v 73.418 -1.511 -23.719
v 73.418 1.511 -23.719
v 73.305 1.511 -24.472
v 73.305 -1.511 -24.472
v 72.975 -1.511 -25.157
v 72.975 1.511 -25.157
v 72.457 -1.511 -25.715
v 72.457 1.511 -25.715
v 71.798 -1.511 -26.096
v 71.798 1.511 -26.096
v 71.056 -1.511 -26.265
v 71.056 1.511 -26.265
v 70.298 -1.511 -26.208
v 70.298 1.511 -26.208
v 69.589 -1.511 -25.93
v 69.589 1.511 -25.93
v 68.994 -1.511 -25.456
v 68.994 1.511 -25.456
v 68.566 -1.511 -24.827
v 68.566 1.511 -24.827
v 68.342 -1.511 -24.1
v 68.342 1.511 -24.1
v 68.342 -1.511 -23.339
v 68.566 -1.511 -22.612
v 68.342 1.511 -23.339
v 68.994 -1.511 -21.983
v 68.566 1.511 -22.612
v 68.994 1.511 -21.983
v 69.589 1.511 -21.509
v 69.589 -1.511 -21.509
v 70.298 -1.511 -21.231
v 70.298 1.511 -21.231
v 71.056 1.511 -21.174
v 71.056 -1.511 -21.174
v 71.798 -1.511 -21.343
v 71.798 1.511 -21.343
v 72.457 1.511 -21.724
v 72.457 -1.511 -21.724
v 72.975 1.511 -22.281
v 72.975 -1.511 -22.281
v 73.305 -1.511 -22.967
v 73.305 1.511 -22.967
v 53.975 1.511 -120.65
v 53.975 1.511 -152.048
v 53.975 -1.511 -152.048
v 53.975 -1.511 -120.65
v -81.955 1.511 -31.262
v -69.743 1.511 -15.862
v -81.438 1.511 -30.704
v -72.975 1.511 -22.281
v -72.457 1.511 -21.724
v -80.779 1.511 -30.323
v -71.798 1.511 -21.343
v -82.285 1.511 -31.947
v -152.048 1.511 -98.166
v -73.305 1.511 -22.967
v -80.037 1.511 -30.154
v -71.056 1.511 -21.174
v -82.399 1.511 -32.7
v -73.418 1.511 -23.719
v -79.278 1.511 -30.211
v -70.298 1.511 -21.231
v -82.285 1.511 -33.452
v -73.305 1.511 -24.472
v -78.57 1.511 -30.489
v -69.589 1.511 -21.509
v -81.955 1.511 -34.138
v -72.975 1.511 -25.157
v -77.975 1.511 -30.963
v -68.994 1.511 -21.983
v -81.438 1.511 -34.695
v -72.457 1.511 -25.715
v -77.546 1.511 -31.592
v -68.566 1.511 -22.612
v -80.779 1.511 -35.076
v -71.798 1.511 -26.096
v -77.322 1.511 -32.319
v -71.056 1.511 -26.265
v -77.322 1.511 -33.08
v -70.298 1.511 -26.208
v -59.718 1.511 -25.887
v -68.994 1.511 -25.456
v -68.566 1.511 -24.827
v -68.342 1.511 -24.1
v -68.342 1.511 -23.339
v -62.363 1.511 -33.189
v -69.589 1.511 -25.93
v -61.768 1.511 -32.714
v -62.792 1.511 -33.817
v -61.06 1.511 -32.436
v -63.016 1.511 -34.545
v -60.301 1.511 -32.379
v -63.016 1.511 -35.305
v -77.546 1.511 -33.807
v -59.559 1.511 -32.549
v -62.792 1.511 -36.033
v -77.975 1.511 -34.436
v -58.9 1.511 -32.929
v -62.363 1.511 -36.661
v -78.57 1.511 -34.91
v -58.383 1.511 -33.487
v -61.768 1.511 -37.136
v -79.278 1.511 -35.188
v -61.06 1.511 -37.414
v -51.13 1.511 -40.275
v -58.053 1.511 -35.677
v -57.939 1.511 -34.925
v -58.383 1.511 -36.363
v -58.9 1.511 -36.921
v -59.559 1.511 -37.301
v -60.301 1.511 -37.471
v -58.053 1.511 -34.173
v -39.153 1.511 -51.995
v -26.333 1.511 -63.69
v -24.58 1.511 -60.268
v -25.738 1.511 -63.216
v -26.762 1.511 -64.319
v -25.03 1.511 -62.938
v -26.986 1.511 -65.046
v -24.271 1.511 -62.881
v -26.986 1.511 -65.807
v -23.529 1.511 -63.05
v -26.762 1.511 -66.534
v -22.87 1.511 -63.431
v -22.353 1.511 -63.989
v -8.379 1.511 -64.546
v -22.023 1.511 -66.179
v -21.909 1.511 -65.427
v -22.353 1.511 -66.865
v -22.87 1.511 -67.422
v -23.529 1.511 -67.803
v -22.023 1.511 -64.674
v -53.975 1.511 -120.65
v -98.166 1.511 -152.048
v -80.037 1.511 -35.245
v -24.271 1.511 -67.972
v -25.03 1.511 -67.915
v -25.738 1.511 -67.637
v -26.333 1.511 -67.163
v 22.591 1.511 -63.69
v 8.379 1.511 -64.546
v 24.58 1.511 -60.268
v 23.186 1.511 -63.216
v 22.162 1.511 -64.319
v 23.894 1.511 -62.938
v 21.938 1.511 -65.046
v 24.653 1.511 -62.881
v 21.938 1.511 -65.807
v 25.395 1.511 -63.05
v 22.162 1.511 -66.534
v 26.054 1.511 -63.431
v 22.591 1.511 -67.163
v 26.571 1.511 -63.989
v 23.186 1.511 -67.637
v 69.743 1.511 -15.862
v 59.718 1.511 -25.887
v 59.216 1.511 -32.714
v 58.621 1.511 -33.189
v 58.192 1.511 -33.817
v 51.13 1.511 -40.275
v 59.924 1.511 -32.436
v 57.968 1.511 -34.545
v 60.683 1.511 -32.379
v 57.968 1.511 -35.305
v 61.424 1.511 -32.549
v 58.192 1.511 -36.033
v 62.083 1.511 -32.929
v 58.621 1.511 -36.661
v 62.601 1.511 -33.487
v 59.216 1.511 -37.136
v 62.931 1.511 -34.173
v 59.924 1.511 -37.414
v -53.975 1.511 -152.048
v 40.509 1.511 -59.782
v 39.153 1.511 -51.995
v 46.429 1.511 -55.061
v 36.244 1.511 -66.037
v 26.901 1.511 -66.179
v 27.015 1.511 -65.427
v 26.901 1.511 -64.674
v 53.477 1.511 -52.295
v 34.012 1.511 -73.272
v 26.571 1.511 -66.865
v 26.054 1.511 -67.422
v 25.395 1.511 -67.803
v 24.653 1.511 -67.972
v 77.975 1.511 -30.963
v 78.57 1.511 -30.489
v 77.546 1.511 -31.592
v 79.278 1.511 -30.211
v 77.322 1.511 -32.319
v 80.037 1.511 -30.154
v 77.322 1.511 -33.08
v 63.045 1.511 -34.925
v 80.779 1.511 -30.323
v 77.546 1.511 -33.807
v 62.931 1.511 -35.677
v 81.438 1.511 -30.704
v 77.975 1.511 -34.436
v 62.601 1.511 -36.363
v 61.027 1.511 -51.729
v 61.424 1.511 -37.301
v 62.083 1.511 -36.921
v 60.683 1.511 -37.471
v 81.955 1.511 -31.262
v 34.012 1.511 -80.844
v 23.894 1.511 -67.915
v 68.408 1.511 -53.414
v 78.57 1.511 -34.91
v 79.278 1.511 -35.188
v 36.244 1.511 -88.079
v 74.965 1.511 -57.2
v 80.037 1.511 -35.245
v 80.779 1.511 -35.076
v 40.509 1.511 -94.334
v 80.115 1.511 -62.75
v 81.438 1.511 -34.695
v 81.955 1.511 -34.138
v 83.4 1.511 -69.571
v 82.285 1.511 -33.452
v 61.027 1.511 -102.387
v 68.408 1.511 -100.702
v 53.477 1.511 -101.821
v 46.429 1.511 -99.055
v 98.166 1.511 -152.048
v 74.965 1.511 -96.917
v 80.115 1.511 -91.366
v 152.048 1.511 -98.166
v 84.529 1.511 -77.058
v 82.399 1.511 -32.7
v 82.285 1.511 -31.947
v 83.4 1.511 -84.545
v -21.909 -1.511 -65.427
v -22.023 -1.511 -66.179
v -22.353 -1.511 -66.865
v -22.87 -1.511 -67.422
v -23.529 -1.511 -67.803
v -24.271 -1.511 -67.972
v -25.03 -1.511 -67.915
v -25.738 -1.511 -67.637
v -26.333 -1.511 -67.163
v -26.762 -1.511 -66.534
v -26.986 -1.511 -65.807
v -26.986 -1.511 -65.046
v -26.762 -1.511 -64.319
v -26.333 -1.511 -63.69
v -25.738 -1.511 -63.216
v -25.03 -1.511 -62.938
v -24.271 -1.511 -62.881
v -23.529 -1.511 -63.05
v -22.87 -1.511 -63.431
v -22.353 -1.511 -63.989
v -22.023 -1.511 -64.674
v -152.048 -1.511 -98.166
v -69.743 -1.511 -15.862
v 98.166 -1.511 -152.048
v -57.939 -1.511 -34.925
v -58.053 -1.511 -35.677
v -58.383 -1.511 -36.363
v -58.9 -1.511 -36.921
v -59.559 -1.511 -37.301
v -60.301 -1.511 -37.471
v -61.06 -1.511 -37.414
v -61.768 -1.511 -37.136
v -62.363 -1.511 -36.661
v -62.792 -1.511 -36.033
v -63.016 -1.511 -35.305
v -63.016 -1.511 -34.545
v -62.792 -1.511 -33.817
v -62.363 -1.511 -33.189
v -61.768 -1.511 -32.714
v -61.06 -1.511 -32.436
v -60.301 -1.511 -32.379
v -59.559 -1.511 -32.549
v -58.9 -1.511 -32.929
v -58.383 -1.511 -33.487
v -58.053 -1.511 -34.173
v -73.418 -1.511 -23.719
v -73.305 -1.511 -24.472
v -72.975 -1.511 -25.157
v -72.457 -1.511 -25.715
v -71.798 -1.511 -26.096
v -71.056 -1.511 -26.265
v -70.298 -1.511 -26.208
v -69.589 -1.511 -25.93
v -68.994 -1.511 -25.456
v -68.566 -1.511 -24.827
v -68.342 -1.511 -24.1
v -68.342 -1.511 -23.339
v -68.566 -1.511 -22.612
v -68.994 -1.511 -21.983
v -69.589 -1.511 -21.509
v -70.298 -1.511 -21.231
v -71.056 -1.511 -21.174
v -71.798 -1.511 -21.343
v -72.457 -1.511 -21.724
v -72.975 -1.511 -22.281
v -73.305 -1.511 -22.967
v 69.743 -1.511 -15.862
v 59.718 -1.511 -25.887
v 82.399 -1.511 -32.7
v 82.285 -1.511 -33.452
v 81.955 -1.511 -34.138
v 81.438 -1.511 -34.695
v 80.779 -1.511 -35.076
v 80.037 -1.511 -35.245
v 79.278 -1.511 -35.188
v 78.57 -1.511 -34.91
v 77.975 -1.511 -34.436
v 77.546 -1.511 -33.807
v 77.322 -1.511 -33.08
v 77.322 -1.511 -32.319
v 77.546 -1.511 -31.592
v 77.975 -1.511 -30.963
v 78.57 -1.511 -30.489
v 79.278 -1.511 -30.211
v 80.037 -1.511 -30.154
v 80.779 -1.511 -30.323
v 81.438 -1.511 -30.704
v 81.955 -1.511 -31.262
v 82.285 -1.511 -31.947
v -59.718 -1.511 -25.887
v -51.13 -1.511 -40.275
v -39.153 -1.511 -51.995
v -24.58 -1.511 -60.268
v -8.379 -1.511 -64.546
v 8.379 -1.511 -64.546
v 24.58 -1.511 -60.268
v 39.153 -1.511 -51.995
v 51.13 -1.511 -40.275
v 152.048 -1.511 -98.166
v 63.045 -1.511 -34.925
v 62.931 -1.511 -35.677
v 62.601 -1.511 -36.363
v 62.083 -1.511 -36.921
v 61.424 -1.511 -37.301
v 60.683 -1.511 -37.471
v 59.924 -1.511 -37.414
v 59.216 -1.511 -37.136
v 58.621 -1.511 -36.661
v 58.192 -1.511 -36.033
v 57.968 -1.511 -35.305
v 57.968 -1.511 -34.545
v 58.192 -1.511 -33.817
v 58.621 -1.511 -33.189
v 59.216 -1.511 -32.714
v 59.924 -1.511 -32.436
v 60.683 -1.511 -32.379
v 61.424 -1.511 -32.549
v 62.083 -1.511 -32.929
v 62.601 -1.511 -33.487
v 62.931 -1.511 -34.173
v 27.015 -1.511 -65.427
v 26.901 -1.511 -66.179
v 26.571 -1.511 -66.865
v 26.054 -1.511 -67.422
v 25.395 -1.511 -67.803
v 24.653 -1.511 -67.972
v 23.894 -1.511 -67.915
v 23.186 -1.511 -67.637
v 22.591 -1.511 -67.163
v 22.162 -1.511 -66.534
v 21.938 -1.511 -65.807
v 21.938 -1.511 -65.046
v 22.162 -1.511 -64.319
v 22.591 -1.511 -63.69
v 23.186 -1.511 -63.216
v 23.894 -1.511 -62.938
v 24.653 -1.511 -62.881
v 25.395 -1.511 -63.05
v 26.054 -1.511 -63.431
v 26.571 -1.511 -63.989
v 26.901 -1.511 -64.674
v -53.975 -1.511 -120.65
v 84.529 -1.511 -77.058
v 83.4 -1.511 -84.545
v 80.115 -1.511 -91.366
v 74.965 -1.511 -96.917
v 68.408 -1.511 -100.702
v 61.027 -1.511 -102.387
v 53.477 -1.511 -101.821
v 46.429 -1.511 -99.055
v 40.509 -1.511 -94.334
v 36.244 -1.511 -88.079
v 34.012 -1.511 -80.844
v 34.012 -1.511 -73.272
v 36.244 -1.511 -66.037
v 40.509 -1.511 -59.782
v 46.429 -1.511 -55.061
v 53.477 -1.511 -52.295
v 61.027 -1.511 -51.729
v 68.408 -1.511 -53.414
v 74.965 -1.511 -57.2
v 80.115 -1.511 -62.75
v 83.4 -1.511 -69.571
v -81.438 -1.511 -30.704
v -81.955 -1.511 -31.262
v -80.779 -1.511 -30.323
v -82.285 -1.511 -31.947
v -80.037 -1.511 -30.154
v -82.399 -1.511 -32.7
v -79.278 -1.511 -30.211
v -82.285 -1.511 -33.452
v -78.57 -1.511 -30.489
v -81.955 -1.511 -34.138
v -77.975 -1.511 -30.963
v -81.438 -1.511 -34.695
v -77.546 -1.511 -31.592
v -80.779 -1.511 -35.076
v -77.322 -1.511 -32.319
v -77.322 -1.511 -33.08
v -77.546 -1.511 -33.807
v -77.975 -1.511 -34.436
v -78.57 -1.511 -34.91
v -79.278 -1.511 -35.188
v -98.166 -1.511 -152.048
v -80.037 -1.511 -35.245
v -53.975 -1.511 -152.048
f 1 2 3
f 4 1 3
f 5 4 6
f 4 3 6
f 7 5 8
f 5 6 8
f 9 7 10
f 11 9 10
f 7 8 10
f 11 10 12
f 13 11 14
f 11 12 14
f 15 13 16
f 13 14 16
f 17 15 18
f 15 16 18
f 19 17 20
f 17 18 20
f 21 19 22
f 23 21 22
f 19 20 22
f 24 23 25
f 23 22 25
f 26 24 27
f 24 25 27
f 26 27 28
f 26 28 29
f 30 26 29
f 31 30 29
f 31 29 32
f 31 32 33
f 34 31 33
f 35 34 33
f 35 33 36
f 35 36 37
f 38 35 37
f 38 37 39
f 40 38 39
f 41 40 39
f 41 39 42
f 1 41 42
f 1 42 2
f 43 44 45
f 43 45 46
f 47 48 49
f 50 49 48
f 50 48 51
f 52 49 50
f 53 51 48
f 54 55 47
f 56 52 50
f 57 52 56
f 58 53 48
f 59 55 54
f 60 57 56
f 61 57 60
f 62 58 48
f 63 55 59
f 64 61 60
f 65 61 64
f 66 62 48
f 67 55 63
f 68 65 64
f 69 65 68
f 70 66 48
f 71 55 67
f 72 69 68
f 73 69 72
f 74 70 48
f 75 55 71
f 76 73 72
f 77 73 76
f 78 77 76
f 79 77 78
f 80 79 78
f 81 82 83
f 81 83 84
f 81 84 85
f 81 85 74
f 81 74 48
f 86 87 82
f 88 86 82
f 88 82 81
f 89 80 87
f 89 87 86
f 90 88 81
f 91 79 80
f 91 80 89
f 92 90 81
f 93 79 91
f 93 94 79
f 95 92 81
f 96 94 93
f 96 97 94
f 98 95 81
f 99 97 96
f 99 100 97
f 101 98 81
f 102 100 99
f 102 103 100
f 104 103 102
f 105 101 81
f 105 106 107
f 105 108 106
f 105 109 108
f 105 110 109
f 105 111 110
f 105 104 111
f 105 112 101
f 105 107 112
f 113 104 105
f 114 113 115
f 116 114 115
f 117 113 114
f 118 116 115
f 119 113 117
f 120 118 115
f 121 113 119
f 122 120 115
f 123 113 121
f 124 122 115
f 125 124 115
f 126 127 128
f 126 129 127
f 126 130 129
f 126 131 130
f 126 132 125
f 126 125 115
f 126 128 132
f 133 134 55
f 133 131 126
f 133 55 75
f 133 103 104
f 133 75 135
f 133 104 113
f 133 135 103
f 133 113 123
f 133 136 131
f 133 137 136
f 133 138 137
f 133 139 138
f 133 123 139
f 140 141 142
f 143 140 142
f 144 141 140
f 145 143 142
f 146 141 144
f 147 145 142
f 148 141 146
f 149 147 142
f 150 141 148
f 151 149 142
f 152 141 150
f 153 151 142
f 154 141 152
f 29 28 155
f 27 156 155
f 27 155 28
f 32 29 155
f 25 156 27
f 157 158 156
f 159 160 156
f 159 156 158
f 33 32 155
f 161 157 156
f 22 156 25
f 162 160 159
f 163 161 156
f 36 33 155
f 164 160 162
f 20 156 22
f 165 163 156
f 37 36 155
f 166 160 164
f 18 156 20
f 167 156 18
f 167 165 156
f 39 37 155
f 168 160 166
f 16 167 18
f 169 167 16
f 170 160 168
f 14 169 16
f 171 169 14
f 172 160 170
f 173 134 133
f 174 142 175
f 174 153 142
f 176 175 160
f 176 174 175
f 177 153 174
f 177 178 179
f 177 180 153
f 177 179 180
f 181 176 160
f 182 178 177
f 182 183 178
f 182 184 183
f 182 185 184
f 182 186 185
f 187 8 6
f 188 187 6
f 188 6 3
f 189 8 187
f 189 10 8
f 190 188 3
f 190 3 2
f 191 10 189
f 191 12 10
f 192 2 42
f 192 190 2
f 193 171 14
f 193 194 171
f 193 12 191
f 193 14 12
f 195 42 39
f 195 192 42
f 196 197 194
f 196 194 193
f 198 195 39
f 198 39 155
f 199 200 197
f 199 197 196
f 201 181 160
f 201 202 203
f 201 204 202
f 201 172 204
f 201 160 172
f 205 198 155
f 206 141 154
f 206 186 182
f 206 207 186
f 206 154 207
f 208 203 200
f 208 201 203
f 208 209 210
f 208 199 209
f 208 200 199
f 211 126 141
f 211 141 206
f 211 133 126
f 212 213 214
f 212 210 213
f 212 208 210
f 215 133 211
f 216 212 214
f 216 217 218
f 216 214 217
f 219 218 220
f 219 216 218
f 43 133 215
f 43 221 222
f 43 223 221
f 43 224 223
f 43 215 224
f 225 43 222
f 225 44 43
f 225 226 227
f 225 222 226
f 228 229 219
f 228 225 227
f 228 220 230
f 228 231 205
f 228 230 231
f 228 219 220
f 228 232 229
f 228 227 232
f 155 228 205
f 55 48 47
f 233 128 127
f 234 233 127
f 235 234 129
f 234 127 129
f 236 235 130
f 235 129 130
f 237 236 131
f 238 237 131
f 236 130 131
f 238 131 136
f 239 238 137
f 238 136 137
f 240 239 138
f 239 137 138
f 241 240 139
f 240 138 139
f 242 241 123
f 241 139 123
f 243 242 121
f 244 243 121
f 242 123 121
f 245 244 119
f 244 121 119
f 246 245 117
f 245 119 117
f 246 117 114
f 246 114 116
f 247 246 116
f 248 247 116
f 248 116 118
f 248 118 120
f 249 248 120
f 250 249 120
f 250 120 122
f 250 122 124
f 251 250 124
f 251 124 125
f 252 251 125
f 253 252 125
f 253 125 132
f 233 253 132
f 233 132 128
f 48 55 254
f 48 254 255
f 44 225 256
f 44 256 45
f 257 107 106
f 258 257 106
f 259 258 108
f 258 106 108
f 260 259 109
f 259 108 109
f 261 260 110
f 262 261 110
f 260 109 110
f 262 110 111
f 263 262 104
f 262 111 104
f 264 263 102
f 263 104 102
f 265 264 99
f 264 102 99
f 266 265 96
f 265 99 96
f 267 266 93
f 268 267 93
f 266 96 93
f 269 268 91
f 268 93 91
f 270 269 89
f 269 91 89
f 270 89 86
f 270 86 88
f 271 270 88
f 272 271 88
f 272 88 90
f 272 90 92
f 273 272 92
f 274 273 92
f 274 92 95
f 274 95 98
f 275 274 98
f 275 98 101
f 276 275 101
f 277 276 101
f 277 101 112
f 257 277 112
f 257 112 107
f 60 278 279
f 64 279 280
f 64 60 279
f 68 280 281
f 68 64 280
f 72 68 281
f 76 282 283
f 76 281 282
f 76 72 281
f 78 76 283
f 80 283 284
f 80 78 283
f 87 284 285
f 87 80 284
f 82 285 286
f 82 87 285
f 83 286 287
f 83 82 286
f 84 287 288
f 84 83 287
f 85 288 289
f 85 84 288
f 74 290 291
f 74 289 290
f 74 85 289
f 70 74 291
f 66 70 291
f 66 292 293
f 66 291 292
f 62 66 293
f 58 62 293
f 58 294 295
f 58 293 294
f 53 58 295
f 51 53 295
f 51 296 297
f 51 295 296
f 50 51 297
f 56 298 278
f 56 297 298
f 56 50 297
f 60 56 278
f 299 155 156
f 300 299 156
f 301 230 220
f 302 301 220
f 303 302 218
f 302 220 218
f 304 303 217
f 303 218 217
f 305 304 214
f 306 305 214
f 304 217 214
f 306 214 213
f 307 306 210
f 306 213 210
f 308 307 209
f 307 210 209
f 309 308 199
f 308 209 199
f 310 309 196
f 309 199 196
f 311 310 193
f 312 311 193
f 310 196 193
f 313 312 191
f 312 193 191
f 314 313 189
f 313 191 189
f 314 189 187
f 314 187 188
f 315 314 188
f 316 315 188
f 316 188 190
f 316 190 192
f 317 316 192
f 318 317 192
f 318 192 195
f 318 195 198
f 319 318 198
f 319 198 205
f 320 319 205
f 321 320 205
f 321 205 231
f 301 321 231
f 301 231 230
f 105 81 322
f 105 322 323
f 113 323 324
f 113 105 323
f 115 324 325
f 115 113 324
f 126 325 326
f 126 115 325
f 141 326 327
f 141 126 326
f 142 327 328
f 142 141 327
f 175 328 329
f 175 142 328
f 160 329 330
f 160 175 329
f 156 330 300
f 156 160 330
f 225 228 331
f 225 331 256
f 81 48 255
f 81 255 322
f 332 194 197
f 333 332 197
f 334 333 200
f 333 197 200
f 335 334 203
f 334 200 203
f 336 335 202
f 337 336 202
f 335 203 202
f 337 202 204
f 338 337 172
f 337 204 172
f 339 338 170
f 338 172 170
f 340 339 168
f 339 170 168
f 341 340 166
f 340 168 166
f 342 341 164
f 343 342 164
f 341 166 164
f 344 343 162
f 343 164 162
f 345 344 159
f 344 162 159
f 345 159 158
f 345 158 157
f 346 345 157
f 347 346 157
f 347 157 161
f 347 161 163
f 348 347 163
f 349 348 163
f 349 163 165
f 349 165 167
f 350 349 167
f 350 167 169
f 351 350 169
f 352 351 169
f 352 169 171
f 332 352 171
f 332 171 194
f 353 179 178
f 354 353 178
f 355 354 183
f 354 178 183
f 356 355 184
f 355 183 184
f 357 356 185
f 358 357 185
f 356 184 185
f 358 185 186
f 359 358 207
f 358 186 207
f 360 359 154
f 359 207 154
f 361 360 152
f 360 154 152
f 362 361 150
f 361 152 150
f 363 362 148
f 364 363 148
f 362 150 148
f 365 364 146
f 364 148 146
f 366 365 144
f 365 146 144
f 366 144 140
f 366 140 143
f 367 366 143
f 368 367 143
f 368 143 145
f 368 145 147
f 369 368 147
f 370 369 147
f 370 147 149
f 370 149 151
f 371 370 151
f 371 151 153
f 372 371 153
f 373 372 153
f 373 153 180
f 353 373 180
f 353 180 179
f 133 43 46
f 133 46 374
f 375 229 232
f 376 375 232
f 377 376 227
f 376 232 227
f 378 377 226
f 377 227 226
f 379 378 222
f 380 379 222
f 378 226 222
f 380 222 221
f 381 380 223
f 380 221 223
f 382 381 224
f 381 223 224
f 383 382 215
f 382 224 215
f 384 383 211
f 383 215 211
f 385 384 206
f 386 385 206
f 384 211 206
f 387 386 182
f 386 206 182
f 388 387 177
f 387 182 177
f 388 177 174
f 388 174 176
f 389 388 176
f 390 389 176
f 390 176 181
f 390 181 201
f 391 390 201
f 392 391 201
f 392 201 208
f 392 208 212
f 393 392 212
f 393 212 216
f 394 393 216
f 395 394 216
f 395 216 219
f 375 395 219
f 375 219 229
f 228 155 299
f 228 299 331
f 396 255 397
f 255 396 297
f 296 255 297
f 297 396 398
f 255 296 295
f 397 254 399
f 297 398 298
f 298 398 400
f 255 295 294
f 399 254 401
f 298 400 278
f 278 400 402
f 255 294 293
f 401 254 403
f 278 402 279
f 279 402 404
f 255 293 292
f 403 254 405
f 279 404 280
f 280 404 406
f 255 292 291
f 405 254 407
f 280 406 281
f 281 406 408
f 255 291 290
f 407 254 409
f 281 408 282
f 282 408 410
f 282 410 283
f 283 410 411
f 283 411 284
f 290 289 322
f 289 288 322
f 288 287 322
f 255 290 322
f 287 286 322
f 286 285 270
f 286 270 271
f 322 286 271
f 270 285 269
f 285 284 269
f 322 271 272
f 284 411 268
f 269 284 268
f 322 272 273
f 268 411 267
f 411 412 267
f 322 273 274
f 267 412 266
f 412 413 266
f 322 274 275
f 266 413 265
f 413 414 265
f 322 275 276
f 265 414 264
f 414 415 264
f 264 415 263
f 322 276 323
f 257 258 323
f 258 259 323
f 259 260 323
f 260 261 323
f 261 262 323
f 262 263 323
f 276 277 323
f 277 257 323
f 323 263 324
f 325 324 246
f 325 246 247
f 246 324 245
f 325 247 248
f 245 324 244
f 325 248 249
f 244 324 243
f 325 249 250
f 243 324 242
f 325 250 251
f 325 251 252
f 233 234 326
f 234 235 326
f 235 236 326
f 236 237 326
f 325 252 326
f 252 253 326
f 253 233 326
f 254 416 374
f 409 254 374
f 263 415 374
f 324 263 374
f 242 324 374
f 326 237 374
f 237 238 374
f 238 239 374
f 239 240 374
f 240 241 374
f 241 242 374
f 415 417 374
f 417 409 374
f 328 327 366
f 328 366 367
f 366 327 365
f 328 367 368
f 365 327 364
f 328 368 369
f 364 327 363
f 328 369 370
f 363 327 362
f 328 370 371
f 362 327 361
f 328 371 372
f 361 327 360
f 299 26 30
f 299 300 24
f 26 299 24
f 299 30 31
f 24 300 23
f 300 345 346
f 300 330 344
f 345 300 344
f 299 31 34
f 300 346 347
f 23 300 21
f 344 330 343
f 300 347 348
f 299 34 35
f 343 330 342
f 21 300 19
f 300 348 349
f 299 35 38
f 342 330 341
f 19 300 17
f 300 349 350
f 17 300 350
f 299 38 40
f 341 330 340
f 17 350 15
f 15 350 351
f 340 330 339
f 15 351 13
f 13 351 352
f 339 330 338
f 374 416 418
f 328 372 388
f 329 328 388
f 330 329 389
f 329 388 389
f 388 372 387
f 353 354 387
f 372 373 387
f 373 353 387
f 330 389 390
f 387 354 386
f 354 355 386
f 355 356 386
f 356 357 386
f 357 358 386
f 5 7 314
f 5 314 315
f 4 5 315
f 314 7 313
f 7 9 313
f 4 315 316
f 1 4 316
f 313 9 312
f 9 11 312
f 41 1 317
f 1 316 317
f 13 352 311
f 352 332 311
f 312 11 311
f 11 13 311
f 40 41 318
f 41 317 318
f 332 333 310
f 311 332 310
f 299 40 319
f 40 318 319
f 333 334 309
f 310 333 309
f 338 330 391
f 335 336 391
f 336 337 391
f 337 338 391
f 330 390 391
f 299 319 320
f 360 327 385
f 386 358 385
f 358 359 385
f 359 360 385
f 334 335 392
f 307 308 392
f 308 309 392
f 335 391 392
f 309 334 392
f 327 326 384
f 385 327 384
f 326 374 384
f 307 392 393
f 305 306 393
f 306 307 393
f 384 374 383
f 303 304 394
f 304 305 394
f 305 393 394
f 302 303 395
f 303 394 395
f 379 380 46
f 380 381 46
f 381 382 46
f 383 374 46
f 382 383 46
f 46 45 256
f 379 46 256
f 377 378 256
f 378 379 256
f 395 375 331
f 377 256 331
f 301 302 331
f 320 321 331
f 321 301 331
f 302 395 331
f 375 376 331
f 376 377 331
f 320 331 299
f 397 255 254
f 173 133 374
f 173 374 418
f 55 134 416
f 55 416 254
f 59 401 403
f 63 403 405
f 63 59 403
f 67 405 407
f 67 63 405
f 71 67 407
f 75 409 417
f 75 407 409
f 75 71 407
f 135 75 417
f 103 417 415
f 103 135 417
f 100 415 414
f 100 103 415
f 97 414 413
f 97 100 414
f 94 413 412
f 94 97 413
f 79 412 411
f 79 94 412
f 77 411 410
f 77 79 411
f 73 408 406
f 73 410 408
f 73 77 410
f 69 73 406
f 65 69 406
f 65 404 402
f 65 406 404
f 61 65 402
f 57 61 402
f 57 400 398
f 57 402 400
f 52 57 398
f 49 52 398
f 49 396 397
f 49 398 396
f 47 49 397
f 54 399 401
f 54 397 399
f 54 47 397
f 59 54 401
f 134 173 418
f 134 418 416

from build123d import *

# Parameters (mm, degrees)
BOSS_EXTRUDE1_DEPTH = 1.5113
SKETCH4_R           = 2.5527
CUT_EXTRUDE1_DEPTH  = 4.0226
CUT_EXTRUDE4_DEPTH  = 4.0226
SKETCH7_R           = 2.5527
CUT_EXTRUDE2_DEPTH  = 4.0226
SKETCH8_R           = 25.4
CUT_EXTRUDE3_DEPTH  = 4.0226


with BuildPart() as part:
    # Sketch3 → Boss-Extrude1 (new body, symmetric)
    with BuildSketch(Plane(origin=(0, 0, 0), x_dir=(1, 0, 0), z_dir=(0, 1, 0))):
        with BuildLine():
            Line((64.255461557, 10.37392483), (152.047852166, 98.16631544))
            Line((152.047852166, 98.16631544), (98.16631544, 152.047852166))
            Line((98.16631544, 152.047852166), (53.975, 152.047852166))
            Line((53.975, 152.047852166), (53.975, 120.65))
            Line((53.975, 120.65), (-53.975, 120.65))
            Line((-53.975, 120.65), (-53.975, 152.047852166))
            Line((-53.975, 152.047852166), (-98.16631544, 152.047852166))
            Line((-98.16631544, 152.047852166), (-152.047852166, 98.16631544))
            Line((-152.047852166, 98.16631544), (-64.255461557, 10.37392483))
            ThreePointArc((-64.255461557, 10.37392483), (0, 65.0875), (64.255461557, 10.37392483))
        make_face()
    extrude(amount=BOSS_EXTRUDE1_DEPTH, both=True)

    # Sketch4 → Cut-Extrude1 (cut, through all)
    with BuildSketch(Plane(origin=(0, 1.5113, 0), x_dir=(1, 0, 0), z_dir=(0, 1, 0))):
        with Locations((24.461985581, 65.426552419)):
            Circle(SKETCH4_R)
        with Locations((60.491874454, 34.925)):
            Circle(SKETCH4_R)
        with Locations((-60.491874454, 34.925)):
            Circle(SKETCH4_R)
        with Locations((-24.461985581, 65.426552419)):
            Circle(SKETCH4_R)
    extrude(amount=-CUT_EXTRUDE1_DEPTH, mode=Mode.SUBTRACT)

    # Sketch6 → Cut-Extrude4 (cut, through all)
    with BuildSketch(Plane(origin=(0, 1.5113, 0), x_dir=(1, 0, 0), z_dir=(0, 1, 0))):
        Polygon((69.743195158, 15.861658432), (60.762939037, 24.841914553), (59.718206073, 25.886647517), (64.255461557, 10.37392483), align=None)
    cut_extrude4 = extrude(amount=-CUT_EXTRUDE4_DEPTH, mode=Mode.SUBTRACT)

    # Sketch7 → Cut-Extrude2 (cut, through all)
    with BuildSketch(Plane(origin=(0, 1.5113, 0), x_dir=(1, 0, 0), z_dir=(0, 1, 0))):
        with Locations((70.865727173, 23.719382538)):
            Circle(SKETCH7_R)
        with Locations((79.845983295, 32.699638659)):
            Circle(SKETCH7_R)
    cut_extrude2 = extrude(amount=-CUT_EXTRUDE2_DEPTH, mode=Mode.SUBTRACT)

    # Mirror1: Cut-Extrude4, Cut-Extrude2 across plane
    add(cut_extrude4.mirror(Plane(origin=(0, 0, 0), x_dir=(0, 0, 1), z_dir=(1, 0, 0))), mode=Mode.SUBTRACT)
    add(cut_extrude2.mirror(Plane(origin=(0, 0, 0), x_dir=(0, 0, 1), z_dir=(1, 0, 0))), mode=Mode.SUBTRACT)

    # Sketch8 → Cut-Extrude3 (cut, through all)
    with BuildSketch(Plane(origin=(0, 1.5113, 0), x_dir=(1, 0, 0), z_dir=(0, 1, 0))):
        with Locations((59.128754095, 77.058092601)):
            Circle(SKETCH8_R)
    extrude(amount=-CUT_EXTRUDE3_DEPTH, mode=Mode.SUBTRACT)


solid = part.part
